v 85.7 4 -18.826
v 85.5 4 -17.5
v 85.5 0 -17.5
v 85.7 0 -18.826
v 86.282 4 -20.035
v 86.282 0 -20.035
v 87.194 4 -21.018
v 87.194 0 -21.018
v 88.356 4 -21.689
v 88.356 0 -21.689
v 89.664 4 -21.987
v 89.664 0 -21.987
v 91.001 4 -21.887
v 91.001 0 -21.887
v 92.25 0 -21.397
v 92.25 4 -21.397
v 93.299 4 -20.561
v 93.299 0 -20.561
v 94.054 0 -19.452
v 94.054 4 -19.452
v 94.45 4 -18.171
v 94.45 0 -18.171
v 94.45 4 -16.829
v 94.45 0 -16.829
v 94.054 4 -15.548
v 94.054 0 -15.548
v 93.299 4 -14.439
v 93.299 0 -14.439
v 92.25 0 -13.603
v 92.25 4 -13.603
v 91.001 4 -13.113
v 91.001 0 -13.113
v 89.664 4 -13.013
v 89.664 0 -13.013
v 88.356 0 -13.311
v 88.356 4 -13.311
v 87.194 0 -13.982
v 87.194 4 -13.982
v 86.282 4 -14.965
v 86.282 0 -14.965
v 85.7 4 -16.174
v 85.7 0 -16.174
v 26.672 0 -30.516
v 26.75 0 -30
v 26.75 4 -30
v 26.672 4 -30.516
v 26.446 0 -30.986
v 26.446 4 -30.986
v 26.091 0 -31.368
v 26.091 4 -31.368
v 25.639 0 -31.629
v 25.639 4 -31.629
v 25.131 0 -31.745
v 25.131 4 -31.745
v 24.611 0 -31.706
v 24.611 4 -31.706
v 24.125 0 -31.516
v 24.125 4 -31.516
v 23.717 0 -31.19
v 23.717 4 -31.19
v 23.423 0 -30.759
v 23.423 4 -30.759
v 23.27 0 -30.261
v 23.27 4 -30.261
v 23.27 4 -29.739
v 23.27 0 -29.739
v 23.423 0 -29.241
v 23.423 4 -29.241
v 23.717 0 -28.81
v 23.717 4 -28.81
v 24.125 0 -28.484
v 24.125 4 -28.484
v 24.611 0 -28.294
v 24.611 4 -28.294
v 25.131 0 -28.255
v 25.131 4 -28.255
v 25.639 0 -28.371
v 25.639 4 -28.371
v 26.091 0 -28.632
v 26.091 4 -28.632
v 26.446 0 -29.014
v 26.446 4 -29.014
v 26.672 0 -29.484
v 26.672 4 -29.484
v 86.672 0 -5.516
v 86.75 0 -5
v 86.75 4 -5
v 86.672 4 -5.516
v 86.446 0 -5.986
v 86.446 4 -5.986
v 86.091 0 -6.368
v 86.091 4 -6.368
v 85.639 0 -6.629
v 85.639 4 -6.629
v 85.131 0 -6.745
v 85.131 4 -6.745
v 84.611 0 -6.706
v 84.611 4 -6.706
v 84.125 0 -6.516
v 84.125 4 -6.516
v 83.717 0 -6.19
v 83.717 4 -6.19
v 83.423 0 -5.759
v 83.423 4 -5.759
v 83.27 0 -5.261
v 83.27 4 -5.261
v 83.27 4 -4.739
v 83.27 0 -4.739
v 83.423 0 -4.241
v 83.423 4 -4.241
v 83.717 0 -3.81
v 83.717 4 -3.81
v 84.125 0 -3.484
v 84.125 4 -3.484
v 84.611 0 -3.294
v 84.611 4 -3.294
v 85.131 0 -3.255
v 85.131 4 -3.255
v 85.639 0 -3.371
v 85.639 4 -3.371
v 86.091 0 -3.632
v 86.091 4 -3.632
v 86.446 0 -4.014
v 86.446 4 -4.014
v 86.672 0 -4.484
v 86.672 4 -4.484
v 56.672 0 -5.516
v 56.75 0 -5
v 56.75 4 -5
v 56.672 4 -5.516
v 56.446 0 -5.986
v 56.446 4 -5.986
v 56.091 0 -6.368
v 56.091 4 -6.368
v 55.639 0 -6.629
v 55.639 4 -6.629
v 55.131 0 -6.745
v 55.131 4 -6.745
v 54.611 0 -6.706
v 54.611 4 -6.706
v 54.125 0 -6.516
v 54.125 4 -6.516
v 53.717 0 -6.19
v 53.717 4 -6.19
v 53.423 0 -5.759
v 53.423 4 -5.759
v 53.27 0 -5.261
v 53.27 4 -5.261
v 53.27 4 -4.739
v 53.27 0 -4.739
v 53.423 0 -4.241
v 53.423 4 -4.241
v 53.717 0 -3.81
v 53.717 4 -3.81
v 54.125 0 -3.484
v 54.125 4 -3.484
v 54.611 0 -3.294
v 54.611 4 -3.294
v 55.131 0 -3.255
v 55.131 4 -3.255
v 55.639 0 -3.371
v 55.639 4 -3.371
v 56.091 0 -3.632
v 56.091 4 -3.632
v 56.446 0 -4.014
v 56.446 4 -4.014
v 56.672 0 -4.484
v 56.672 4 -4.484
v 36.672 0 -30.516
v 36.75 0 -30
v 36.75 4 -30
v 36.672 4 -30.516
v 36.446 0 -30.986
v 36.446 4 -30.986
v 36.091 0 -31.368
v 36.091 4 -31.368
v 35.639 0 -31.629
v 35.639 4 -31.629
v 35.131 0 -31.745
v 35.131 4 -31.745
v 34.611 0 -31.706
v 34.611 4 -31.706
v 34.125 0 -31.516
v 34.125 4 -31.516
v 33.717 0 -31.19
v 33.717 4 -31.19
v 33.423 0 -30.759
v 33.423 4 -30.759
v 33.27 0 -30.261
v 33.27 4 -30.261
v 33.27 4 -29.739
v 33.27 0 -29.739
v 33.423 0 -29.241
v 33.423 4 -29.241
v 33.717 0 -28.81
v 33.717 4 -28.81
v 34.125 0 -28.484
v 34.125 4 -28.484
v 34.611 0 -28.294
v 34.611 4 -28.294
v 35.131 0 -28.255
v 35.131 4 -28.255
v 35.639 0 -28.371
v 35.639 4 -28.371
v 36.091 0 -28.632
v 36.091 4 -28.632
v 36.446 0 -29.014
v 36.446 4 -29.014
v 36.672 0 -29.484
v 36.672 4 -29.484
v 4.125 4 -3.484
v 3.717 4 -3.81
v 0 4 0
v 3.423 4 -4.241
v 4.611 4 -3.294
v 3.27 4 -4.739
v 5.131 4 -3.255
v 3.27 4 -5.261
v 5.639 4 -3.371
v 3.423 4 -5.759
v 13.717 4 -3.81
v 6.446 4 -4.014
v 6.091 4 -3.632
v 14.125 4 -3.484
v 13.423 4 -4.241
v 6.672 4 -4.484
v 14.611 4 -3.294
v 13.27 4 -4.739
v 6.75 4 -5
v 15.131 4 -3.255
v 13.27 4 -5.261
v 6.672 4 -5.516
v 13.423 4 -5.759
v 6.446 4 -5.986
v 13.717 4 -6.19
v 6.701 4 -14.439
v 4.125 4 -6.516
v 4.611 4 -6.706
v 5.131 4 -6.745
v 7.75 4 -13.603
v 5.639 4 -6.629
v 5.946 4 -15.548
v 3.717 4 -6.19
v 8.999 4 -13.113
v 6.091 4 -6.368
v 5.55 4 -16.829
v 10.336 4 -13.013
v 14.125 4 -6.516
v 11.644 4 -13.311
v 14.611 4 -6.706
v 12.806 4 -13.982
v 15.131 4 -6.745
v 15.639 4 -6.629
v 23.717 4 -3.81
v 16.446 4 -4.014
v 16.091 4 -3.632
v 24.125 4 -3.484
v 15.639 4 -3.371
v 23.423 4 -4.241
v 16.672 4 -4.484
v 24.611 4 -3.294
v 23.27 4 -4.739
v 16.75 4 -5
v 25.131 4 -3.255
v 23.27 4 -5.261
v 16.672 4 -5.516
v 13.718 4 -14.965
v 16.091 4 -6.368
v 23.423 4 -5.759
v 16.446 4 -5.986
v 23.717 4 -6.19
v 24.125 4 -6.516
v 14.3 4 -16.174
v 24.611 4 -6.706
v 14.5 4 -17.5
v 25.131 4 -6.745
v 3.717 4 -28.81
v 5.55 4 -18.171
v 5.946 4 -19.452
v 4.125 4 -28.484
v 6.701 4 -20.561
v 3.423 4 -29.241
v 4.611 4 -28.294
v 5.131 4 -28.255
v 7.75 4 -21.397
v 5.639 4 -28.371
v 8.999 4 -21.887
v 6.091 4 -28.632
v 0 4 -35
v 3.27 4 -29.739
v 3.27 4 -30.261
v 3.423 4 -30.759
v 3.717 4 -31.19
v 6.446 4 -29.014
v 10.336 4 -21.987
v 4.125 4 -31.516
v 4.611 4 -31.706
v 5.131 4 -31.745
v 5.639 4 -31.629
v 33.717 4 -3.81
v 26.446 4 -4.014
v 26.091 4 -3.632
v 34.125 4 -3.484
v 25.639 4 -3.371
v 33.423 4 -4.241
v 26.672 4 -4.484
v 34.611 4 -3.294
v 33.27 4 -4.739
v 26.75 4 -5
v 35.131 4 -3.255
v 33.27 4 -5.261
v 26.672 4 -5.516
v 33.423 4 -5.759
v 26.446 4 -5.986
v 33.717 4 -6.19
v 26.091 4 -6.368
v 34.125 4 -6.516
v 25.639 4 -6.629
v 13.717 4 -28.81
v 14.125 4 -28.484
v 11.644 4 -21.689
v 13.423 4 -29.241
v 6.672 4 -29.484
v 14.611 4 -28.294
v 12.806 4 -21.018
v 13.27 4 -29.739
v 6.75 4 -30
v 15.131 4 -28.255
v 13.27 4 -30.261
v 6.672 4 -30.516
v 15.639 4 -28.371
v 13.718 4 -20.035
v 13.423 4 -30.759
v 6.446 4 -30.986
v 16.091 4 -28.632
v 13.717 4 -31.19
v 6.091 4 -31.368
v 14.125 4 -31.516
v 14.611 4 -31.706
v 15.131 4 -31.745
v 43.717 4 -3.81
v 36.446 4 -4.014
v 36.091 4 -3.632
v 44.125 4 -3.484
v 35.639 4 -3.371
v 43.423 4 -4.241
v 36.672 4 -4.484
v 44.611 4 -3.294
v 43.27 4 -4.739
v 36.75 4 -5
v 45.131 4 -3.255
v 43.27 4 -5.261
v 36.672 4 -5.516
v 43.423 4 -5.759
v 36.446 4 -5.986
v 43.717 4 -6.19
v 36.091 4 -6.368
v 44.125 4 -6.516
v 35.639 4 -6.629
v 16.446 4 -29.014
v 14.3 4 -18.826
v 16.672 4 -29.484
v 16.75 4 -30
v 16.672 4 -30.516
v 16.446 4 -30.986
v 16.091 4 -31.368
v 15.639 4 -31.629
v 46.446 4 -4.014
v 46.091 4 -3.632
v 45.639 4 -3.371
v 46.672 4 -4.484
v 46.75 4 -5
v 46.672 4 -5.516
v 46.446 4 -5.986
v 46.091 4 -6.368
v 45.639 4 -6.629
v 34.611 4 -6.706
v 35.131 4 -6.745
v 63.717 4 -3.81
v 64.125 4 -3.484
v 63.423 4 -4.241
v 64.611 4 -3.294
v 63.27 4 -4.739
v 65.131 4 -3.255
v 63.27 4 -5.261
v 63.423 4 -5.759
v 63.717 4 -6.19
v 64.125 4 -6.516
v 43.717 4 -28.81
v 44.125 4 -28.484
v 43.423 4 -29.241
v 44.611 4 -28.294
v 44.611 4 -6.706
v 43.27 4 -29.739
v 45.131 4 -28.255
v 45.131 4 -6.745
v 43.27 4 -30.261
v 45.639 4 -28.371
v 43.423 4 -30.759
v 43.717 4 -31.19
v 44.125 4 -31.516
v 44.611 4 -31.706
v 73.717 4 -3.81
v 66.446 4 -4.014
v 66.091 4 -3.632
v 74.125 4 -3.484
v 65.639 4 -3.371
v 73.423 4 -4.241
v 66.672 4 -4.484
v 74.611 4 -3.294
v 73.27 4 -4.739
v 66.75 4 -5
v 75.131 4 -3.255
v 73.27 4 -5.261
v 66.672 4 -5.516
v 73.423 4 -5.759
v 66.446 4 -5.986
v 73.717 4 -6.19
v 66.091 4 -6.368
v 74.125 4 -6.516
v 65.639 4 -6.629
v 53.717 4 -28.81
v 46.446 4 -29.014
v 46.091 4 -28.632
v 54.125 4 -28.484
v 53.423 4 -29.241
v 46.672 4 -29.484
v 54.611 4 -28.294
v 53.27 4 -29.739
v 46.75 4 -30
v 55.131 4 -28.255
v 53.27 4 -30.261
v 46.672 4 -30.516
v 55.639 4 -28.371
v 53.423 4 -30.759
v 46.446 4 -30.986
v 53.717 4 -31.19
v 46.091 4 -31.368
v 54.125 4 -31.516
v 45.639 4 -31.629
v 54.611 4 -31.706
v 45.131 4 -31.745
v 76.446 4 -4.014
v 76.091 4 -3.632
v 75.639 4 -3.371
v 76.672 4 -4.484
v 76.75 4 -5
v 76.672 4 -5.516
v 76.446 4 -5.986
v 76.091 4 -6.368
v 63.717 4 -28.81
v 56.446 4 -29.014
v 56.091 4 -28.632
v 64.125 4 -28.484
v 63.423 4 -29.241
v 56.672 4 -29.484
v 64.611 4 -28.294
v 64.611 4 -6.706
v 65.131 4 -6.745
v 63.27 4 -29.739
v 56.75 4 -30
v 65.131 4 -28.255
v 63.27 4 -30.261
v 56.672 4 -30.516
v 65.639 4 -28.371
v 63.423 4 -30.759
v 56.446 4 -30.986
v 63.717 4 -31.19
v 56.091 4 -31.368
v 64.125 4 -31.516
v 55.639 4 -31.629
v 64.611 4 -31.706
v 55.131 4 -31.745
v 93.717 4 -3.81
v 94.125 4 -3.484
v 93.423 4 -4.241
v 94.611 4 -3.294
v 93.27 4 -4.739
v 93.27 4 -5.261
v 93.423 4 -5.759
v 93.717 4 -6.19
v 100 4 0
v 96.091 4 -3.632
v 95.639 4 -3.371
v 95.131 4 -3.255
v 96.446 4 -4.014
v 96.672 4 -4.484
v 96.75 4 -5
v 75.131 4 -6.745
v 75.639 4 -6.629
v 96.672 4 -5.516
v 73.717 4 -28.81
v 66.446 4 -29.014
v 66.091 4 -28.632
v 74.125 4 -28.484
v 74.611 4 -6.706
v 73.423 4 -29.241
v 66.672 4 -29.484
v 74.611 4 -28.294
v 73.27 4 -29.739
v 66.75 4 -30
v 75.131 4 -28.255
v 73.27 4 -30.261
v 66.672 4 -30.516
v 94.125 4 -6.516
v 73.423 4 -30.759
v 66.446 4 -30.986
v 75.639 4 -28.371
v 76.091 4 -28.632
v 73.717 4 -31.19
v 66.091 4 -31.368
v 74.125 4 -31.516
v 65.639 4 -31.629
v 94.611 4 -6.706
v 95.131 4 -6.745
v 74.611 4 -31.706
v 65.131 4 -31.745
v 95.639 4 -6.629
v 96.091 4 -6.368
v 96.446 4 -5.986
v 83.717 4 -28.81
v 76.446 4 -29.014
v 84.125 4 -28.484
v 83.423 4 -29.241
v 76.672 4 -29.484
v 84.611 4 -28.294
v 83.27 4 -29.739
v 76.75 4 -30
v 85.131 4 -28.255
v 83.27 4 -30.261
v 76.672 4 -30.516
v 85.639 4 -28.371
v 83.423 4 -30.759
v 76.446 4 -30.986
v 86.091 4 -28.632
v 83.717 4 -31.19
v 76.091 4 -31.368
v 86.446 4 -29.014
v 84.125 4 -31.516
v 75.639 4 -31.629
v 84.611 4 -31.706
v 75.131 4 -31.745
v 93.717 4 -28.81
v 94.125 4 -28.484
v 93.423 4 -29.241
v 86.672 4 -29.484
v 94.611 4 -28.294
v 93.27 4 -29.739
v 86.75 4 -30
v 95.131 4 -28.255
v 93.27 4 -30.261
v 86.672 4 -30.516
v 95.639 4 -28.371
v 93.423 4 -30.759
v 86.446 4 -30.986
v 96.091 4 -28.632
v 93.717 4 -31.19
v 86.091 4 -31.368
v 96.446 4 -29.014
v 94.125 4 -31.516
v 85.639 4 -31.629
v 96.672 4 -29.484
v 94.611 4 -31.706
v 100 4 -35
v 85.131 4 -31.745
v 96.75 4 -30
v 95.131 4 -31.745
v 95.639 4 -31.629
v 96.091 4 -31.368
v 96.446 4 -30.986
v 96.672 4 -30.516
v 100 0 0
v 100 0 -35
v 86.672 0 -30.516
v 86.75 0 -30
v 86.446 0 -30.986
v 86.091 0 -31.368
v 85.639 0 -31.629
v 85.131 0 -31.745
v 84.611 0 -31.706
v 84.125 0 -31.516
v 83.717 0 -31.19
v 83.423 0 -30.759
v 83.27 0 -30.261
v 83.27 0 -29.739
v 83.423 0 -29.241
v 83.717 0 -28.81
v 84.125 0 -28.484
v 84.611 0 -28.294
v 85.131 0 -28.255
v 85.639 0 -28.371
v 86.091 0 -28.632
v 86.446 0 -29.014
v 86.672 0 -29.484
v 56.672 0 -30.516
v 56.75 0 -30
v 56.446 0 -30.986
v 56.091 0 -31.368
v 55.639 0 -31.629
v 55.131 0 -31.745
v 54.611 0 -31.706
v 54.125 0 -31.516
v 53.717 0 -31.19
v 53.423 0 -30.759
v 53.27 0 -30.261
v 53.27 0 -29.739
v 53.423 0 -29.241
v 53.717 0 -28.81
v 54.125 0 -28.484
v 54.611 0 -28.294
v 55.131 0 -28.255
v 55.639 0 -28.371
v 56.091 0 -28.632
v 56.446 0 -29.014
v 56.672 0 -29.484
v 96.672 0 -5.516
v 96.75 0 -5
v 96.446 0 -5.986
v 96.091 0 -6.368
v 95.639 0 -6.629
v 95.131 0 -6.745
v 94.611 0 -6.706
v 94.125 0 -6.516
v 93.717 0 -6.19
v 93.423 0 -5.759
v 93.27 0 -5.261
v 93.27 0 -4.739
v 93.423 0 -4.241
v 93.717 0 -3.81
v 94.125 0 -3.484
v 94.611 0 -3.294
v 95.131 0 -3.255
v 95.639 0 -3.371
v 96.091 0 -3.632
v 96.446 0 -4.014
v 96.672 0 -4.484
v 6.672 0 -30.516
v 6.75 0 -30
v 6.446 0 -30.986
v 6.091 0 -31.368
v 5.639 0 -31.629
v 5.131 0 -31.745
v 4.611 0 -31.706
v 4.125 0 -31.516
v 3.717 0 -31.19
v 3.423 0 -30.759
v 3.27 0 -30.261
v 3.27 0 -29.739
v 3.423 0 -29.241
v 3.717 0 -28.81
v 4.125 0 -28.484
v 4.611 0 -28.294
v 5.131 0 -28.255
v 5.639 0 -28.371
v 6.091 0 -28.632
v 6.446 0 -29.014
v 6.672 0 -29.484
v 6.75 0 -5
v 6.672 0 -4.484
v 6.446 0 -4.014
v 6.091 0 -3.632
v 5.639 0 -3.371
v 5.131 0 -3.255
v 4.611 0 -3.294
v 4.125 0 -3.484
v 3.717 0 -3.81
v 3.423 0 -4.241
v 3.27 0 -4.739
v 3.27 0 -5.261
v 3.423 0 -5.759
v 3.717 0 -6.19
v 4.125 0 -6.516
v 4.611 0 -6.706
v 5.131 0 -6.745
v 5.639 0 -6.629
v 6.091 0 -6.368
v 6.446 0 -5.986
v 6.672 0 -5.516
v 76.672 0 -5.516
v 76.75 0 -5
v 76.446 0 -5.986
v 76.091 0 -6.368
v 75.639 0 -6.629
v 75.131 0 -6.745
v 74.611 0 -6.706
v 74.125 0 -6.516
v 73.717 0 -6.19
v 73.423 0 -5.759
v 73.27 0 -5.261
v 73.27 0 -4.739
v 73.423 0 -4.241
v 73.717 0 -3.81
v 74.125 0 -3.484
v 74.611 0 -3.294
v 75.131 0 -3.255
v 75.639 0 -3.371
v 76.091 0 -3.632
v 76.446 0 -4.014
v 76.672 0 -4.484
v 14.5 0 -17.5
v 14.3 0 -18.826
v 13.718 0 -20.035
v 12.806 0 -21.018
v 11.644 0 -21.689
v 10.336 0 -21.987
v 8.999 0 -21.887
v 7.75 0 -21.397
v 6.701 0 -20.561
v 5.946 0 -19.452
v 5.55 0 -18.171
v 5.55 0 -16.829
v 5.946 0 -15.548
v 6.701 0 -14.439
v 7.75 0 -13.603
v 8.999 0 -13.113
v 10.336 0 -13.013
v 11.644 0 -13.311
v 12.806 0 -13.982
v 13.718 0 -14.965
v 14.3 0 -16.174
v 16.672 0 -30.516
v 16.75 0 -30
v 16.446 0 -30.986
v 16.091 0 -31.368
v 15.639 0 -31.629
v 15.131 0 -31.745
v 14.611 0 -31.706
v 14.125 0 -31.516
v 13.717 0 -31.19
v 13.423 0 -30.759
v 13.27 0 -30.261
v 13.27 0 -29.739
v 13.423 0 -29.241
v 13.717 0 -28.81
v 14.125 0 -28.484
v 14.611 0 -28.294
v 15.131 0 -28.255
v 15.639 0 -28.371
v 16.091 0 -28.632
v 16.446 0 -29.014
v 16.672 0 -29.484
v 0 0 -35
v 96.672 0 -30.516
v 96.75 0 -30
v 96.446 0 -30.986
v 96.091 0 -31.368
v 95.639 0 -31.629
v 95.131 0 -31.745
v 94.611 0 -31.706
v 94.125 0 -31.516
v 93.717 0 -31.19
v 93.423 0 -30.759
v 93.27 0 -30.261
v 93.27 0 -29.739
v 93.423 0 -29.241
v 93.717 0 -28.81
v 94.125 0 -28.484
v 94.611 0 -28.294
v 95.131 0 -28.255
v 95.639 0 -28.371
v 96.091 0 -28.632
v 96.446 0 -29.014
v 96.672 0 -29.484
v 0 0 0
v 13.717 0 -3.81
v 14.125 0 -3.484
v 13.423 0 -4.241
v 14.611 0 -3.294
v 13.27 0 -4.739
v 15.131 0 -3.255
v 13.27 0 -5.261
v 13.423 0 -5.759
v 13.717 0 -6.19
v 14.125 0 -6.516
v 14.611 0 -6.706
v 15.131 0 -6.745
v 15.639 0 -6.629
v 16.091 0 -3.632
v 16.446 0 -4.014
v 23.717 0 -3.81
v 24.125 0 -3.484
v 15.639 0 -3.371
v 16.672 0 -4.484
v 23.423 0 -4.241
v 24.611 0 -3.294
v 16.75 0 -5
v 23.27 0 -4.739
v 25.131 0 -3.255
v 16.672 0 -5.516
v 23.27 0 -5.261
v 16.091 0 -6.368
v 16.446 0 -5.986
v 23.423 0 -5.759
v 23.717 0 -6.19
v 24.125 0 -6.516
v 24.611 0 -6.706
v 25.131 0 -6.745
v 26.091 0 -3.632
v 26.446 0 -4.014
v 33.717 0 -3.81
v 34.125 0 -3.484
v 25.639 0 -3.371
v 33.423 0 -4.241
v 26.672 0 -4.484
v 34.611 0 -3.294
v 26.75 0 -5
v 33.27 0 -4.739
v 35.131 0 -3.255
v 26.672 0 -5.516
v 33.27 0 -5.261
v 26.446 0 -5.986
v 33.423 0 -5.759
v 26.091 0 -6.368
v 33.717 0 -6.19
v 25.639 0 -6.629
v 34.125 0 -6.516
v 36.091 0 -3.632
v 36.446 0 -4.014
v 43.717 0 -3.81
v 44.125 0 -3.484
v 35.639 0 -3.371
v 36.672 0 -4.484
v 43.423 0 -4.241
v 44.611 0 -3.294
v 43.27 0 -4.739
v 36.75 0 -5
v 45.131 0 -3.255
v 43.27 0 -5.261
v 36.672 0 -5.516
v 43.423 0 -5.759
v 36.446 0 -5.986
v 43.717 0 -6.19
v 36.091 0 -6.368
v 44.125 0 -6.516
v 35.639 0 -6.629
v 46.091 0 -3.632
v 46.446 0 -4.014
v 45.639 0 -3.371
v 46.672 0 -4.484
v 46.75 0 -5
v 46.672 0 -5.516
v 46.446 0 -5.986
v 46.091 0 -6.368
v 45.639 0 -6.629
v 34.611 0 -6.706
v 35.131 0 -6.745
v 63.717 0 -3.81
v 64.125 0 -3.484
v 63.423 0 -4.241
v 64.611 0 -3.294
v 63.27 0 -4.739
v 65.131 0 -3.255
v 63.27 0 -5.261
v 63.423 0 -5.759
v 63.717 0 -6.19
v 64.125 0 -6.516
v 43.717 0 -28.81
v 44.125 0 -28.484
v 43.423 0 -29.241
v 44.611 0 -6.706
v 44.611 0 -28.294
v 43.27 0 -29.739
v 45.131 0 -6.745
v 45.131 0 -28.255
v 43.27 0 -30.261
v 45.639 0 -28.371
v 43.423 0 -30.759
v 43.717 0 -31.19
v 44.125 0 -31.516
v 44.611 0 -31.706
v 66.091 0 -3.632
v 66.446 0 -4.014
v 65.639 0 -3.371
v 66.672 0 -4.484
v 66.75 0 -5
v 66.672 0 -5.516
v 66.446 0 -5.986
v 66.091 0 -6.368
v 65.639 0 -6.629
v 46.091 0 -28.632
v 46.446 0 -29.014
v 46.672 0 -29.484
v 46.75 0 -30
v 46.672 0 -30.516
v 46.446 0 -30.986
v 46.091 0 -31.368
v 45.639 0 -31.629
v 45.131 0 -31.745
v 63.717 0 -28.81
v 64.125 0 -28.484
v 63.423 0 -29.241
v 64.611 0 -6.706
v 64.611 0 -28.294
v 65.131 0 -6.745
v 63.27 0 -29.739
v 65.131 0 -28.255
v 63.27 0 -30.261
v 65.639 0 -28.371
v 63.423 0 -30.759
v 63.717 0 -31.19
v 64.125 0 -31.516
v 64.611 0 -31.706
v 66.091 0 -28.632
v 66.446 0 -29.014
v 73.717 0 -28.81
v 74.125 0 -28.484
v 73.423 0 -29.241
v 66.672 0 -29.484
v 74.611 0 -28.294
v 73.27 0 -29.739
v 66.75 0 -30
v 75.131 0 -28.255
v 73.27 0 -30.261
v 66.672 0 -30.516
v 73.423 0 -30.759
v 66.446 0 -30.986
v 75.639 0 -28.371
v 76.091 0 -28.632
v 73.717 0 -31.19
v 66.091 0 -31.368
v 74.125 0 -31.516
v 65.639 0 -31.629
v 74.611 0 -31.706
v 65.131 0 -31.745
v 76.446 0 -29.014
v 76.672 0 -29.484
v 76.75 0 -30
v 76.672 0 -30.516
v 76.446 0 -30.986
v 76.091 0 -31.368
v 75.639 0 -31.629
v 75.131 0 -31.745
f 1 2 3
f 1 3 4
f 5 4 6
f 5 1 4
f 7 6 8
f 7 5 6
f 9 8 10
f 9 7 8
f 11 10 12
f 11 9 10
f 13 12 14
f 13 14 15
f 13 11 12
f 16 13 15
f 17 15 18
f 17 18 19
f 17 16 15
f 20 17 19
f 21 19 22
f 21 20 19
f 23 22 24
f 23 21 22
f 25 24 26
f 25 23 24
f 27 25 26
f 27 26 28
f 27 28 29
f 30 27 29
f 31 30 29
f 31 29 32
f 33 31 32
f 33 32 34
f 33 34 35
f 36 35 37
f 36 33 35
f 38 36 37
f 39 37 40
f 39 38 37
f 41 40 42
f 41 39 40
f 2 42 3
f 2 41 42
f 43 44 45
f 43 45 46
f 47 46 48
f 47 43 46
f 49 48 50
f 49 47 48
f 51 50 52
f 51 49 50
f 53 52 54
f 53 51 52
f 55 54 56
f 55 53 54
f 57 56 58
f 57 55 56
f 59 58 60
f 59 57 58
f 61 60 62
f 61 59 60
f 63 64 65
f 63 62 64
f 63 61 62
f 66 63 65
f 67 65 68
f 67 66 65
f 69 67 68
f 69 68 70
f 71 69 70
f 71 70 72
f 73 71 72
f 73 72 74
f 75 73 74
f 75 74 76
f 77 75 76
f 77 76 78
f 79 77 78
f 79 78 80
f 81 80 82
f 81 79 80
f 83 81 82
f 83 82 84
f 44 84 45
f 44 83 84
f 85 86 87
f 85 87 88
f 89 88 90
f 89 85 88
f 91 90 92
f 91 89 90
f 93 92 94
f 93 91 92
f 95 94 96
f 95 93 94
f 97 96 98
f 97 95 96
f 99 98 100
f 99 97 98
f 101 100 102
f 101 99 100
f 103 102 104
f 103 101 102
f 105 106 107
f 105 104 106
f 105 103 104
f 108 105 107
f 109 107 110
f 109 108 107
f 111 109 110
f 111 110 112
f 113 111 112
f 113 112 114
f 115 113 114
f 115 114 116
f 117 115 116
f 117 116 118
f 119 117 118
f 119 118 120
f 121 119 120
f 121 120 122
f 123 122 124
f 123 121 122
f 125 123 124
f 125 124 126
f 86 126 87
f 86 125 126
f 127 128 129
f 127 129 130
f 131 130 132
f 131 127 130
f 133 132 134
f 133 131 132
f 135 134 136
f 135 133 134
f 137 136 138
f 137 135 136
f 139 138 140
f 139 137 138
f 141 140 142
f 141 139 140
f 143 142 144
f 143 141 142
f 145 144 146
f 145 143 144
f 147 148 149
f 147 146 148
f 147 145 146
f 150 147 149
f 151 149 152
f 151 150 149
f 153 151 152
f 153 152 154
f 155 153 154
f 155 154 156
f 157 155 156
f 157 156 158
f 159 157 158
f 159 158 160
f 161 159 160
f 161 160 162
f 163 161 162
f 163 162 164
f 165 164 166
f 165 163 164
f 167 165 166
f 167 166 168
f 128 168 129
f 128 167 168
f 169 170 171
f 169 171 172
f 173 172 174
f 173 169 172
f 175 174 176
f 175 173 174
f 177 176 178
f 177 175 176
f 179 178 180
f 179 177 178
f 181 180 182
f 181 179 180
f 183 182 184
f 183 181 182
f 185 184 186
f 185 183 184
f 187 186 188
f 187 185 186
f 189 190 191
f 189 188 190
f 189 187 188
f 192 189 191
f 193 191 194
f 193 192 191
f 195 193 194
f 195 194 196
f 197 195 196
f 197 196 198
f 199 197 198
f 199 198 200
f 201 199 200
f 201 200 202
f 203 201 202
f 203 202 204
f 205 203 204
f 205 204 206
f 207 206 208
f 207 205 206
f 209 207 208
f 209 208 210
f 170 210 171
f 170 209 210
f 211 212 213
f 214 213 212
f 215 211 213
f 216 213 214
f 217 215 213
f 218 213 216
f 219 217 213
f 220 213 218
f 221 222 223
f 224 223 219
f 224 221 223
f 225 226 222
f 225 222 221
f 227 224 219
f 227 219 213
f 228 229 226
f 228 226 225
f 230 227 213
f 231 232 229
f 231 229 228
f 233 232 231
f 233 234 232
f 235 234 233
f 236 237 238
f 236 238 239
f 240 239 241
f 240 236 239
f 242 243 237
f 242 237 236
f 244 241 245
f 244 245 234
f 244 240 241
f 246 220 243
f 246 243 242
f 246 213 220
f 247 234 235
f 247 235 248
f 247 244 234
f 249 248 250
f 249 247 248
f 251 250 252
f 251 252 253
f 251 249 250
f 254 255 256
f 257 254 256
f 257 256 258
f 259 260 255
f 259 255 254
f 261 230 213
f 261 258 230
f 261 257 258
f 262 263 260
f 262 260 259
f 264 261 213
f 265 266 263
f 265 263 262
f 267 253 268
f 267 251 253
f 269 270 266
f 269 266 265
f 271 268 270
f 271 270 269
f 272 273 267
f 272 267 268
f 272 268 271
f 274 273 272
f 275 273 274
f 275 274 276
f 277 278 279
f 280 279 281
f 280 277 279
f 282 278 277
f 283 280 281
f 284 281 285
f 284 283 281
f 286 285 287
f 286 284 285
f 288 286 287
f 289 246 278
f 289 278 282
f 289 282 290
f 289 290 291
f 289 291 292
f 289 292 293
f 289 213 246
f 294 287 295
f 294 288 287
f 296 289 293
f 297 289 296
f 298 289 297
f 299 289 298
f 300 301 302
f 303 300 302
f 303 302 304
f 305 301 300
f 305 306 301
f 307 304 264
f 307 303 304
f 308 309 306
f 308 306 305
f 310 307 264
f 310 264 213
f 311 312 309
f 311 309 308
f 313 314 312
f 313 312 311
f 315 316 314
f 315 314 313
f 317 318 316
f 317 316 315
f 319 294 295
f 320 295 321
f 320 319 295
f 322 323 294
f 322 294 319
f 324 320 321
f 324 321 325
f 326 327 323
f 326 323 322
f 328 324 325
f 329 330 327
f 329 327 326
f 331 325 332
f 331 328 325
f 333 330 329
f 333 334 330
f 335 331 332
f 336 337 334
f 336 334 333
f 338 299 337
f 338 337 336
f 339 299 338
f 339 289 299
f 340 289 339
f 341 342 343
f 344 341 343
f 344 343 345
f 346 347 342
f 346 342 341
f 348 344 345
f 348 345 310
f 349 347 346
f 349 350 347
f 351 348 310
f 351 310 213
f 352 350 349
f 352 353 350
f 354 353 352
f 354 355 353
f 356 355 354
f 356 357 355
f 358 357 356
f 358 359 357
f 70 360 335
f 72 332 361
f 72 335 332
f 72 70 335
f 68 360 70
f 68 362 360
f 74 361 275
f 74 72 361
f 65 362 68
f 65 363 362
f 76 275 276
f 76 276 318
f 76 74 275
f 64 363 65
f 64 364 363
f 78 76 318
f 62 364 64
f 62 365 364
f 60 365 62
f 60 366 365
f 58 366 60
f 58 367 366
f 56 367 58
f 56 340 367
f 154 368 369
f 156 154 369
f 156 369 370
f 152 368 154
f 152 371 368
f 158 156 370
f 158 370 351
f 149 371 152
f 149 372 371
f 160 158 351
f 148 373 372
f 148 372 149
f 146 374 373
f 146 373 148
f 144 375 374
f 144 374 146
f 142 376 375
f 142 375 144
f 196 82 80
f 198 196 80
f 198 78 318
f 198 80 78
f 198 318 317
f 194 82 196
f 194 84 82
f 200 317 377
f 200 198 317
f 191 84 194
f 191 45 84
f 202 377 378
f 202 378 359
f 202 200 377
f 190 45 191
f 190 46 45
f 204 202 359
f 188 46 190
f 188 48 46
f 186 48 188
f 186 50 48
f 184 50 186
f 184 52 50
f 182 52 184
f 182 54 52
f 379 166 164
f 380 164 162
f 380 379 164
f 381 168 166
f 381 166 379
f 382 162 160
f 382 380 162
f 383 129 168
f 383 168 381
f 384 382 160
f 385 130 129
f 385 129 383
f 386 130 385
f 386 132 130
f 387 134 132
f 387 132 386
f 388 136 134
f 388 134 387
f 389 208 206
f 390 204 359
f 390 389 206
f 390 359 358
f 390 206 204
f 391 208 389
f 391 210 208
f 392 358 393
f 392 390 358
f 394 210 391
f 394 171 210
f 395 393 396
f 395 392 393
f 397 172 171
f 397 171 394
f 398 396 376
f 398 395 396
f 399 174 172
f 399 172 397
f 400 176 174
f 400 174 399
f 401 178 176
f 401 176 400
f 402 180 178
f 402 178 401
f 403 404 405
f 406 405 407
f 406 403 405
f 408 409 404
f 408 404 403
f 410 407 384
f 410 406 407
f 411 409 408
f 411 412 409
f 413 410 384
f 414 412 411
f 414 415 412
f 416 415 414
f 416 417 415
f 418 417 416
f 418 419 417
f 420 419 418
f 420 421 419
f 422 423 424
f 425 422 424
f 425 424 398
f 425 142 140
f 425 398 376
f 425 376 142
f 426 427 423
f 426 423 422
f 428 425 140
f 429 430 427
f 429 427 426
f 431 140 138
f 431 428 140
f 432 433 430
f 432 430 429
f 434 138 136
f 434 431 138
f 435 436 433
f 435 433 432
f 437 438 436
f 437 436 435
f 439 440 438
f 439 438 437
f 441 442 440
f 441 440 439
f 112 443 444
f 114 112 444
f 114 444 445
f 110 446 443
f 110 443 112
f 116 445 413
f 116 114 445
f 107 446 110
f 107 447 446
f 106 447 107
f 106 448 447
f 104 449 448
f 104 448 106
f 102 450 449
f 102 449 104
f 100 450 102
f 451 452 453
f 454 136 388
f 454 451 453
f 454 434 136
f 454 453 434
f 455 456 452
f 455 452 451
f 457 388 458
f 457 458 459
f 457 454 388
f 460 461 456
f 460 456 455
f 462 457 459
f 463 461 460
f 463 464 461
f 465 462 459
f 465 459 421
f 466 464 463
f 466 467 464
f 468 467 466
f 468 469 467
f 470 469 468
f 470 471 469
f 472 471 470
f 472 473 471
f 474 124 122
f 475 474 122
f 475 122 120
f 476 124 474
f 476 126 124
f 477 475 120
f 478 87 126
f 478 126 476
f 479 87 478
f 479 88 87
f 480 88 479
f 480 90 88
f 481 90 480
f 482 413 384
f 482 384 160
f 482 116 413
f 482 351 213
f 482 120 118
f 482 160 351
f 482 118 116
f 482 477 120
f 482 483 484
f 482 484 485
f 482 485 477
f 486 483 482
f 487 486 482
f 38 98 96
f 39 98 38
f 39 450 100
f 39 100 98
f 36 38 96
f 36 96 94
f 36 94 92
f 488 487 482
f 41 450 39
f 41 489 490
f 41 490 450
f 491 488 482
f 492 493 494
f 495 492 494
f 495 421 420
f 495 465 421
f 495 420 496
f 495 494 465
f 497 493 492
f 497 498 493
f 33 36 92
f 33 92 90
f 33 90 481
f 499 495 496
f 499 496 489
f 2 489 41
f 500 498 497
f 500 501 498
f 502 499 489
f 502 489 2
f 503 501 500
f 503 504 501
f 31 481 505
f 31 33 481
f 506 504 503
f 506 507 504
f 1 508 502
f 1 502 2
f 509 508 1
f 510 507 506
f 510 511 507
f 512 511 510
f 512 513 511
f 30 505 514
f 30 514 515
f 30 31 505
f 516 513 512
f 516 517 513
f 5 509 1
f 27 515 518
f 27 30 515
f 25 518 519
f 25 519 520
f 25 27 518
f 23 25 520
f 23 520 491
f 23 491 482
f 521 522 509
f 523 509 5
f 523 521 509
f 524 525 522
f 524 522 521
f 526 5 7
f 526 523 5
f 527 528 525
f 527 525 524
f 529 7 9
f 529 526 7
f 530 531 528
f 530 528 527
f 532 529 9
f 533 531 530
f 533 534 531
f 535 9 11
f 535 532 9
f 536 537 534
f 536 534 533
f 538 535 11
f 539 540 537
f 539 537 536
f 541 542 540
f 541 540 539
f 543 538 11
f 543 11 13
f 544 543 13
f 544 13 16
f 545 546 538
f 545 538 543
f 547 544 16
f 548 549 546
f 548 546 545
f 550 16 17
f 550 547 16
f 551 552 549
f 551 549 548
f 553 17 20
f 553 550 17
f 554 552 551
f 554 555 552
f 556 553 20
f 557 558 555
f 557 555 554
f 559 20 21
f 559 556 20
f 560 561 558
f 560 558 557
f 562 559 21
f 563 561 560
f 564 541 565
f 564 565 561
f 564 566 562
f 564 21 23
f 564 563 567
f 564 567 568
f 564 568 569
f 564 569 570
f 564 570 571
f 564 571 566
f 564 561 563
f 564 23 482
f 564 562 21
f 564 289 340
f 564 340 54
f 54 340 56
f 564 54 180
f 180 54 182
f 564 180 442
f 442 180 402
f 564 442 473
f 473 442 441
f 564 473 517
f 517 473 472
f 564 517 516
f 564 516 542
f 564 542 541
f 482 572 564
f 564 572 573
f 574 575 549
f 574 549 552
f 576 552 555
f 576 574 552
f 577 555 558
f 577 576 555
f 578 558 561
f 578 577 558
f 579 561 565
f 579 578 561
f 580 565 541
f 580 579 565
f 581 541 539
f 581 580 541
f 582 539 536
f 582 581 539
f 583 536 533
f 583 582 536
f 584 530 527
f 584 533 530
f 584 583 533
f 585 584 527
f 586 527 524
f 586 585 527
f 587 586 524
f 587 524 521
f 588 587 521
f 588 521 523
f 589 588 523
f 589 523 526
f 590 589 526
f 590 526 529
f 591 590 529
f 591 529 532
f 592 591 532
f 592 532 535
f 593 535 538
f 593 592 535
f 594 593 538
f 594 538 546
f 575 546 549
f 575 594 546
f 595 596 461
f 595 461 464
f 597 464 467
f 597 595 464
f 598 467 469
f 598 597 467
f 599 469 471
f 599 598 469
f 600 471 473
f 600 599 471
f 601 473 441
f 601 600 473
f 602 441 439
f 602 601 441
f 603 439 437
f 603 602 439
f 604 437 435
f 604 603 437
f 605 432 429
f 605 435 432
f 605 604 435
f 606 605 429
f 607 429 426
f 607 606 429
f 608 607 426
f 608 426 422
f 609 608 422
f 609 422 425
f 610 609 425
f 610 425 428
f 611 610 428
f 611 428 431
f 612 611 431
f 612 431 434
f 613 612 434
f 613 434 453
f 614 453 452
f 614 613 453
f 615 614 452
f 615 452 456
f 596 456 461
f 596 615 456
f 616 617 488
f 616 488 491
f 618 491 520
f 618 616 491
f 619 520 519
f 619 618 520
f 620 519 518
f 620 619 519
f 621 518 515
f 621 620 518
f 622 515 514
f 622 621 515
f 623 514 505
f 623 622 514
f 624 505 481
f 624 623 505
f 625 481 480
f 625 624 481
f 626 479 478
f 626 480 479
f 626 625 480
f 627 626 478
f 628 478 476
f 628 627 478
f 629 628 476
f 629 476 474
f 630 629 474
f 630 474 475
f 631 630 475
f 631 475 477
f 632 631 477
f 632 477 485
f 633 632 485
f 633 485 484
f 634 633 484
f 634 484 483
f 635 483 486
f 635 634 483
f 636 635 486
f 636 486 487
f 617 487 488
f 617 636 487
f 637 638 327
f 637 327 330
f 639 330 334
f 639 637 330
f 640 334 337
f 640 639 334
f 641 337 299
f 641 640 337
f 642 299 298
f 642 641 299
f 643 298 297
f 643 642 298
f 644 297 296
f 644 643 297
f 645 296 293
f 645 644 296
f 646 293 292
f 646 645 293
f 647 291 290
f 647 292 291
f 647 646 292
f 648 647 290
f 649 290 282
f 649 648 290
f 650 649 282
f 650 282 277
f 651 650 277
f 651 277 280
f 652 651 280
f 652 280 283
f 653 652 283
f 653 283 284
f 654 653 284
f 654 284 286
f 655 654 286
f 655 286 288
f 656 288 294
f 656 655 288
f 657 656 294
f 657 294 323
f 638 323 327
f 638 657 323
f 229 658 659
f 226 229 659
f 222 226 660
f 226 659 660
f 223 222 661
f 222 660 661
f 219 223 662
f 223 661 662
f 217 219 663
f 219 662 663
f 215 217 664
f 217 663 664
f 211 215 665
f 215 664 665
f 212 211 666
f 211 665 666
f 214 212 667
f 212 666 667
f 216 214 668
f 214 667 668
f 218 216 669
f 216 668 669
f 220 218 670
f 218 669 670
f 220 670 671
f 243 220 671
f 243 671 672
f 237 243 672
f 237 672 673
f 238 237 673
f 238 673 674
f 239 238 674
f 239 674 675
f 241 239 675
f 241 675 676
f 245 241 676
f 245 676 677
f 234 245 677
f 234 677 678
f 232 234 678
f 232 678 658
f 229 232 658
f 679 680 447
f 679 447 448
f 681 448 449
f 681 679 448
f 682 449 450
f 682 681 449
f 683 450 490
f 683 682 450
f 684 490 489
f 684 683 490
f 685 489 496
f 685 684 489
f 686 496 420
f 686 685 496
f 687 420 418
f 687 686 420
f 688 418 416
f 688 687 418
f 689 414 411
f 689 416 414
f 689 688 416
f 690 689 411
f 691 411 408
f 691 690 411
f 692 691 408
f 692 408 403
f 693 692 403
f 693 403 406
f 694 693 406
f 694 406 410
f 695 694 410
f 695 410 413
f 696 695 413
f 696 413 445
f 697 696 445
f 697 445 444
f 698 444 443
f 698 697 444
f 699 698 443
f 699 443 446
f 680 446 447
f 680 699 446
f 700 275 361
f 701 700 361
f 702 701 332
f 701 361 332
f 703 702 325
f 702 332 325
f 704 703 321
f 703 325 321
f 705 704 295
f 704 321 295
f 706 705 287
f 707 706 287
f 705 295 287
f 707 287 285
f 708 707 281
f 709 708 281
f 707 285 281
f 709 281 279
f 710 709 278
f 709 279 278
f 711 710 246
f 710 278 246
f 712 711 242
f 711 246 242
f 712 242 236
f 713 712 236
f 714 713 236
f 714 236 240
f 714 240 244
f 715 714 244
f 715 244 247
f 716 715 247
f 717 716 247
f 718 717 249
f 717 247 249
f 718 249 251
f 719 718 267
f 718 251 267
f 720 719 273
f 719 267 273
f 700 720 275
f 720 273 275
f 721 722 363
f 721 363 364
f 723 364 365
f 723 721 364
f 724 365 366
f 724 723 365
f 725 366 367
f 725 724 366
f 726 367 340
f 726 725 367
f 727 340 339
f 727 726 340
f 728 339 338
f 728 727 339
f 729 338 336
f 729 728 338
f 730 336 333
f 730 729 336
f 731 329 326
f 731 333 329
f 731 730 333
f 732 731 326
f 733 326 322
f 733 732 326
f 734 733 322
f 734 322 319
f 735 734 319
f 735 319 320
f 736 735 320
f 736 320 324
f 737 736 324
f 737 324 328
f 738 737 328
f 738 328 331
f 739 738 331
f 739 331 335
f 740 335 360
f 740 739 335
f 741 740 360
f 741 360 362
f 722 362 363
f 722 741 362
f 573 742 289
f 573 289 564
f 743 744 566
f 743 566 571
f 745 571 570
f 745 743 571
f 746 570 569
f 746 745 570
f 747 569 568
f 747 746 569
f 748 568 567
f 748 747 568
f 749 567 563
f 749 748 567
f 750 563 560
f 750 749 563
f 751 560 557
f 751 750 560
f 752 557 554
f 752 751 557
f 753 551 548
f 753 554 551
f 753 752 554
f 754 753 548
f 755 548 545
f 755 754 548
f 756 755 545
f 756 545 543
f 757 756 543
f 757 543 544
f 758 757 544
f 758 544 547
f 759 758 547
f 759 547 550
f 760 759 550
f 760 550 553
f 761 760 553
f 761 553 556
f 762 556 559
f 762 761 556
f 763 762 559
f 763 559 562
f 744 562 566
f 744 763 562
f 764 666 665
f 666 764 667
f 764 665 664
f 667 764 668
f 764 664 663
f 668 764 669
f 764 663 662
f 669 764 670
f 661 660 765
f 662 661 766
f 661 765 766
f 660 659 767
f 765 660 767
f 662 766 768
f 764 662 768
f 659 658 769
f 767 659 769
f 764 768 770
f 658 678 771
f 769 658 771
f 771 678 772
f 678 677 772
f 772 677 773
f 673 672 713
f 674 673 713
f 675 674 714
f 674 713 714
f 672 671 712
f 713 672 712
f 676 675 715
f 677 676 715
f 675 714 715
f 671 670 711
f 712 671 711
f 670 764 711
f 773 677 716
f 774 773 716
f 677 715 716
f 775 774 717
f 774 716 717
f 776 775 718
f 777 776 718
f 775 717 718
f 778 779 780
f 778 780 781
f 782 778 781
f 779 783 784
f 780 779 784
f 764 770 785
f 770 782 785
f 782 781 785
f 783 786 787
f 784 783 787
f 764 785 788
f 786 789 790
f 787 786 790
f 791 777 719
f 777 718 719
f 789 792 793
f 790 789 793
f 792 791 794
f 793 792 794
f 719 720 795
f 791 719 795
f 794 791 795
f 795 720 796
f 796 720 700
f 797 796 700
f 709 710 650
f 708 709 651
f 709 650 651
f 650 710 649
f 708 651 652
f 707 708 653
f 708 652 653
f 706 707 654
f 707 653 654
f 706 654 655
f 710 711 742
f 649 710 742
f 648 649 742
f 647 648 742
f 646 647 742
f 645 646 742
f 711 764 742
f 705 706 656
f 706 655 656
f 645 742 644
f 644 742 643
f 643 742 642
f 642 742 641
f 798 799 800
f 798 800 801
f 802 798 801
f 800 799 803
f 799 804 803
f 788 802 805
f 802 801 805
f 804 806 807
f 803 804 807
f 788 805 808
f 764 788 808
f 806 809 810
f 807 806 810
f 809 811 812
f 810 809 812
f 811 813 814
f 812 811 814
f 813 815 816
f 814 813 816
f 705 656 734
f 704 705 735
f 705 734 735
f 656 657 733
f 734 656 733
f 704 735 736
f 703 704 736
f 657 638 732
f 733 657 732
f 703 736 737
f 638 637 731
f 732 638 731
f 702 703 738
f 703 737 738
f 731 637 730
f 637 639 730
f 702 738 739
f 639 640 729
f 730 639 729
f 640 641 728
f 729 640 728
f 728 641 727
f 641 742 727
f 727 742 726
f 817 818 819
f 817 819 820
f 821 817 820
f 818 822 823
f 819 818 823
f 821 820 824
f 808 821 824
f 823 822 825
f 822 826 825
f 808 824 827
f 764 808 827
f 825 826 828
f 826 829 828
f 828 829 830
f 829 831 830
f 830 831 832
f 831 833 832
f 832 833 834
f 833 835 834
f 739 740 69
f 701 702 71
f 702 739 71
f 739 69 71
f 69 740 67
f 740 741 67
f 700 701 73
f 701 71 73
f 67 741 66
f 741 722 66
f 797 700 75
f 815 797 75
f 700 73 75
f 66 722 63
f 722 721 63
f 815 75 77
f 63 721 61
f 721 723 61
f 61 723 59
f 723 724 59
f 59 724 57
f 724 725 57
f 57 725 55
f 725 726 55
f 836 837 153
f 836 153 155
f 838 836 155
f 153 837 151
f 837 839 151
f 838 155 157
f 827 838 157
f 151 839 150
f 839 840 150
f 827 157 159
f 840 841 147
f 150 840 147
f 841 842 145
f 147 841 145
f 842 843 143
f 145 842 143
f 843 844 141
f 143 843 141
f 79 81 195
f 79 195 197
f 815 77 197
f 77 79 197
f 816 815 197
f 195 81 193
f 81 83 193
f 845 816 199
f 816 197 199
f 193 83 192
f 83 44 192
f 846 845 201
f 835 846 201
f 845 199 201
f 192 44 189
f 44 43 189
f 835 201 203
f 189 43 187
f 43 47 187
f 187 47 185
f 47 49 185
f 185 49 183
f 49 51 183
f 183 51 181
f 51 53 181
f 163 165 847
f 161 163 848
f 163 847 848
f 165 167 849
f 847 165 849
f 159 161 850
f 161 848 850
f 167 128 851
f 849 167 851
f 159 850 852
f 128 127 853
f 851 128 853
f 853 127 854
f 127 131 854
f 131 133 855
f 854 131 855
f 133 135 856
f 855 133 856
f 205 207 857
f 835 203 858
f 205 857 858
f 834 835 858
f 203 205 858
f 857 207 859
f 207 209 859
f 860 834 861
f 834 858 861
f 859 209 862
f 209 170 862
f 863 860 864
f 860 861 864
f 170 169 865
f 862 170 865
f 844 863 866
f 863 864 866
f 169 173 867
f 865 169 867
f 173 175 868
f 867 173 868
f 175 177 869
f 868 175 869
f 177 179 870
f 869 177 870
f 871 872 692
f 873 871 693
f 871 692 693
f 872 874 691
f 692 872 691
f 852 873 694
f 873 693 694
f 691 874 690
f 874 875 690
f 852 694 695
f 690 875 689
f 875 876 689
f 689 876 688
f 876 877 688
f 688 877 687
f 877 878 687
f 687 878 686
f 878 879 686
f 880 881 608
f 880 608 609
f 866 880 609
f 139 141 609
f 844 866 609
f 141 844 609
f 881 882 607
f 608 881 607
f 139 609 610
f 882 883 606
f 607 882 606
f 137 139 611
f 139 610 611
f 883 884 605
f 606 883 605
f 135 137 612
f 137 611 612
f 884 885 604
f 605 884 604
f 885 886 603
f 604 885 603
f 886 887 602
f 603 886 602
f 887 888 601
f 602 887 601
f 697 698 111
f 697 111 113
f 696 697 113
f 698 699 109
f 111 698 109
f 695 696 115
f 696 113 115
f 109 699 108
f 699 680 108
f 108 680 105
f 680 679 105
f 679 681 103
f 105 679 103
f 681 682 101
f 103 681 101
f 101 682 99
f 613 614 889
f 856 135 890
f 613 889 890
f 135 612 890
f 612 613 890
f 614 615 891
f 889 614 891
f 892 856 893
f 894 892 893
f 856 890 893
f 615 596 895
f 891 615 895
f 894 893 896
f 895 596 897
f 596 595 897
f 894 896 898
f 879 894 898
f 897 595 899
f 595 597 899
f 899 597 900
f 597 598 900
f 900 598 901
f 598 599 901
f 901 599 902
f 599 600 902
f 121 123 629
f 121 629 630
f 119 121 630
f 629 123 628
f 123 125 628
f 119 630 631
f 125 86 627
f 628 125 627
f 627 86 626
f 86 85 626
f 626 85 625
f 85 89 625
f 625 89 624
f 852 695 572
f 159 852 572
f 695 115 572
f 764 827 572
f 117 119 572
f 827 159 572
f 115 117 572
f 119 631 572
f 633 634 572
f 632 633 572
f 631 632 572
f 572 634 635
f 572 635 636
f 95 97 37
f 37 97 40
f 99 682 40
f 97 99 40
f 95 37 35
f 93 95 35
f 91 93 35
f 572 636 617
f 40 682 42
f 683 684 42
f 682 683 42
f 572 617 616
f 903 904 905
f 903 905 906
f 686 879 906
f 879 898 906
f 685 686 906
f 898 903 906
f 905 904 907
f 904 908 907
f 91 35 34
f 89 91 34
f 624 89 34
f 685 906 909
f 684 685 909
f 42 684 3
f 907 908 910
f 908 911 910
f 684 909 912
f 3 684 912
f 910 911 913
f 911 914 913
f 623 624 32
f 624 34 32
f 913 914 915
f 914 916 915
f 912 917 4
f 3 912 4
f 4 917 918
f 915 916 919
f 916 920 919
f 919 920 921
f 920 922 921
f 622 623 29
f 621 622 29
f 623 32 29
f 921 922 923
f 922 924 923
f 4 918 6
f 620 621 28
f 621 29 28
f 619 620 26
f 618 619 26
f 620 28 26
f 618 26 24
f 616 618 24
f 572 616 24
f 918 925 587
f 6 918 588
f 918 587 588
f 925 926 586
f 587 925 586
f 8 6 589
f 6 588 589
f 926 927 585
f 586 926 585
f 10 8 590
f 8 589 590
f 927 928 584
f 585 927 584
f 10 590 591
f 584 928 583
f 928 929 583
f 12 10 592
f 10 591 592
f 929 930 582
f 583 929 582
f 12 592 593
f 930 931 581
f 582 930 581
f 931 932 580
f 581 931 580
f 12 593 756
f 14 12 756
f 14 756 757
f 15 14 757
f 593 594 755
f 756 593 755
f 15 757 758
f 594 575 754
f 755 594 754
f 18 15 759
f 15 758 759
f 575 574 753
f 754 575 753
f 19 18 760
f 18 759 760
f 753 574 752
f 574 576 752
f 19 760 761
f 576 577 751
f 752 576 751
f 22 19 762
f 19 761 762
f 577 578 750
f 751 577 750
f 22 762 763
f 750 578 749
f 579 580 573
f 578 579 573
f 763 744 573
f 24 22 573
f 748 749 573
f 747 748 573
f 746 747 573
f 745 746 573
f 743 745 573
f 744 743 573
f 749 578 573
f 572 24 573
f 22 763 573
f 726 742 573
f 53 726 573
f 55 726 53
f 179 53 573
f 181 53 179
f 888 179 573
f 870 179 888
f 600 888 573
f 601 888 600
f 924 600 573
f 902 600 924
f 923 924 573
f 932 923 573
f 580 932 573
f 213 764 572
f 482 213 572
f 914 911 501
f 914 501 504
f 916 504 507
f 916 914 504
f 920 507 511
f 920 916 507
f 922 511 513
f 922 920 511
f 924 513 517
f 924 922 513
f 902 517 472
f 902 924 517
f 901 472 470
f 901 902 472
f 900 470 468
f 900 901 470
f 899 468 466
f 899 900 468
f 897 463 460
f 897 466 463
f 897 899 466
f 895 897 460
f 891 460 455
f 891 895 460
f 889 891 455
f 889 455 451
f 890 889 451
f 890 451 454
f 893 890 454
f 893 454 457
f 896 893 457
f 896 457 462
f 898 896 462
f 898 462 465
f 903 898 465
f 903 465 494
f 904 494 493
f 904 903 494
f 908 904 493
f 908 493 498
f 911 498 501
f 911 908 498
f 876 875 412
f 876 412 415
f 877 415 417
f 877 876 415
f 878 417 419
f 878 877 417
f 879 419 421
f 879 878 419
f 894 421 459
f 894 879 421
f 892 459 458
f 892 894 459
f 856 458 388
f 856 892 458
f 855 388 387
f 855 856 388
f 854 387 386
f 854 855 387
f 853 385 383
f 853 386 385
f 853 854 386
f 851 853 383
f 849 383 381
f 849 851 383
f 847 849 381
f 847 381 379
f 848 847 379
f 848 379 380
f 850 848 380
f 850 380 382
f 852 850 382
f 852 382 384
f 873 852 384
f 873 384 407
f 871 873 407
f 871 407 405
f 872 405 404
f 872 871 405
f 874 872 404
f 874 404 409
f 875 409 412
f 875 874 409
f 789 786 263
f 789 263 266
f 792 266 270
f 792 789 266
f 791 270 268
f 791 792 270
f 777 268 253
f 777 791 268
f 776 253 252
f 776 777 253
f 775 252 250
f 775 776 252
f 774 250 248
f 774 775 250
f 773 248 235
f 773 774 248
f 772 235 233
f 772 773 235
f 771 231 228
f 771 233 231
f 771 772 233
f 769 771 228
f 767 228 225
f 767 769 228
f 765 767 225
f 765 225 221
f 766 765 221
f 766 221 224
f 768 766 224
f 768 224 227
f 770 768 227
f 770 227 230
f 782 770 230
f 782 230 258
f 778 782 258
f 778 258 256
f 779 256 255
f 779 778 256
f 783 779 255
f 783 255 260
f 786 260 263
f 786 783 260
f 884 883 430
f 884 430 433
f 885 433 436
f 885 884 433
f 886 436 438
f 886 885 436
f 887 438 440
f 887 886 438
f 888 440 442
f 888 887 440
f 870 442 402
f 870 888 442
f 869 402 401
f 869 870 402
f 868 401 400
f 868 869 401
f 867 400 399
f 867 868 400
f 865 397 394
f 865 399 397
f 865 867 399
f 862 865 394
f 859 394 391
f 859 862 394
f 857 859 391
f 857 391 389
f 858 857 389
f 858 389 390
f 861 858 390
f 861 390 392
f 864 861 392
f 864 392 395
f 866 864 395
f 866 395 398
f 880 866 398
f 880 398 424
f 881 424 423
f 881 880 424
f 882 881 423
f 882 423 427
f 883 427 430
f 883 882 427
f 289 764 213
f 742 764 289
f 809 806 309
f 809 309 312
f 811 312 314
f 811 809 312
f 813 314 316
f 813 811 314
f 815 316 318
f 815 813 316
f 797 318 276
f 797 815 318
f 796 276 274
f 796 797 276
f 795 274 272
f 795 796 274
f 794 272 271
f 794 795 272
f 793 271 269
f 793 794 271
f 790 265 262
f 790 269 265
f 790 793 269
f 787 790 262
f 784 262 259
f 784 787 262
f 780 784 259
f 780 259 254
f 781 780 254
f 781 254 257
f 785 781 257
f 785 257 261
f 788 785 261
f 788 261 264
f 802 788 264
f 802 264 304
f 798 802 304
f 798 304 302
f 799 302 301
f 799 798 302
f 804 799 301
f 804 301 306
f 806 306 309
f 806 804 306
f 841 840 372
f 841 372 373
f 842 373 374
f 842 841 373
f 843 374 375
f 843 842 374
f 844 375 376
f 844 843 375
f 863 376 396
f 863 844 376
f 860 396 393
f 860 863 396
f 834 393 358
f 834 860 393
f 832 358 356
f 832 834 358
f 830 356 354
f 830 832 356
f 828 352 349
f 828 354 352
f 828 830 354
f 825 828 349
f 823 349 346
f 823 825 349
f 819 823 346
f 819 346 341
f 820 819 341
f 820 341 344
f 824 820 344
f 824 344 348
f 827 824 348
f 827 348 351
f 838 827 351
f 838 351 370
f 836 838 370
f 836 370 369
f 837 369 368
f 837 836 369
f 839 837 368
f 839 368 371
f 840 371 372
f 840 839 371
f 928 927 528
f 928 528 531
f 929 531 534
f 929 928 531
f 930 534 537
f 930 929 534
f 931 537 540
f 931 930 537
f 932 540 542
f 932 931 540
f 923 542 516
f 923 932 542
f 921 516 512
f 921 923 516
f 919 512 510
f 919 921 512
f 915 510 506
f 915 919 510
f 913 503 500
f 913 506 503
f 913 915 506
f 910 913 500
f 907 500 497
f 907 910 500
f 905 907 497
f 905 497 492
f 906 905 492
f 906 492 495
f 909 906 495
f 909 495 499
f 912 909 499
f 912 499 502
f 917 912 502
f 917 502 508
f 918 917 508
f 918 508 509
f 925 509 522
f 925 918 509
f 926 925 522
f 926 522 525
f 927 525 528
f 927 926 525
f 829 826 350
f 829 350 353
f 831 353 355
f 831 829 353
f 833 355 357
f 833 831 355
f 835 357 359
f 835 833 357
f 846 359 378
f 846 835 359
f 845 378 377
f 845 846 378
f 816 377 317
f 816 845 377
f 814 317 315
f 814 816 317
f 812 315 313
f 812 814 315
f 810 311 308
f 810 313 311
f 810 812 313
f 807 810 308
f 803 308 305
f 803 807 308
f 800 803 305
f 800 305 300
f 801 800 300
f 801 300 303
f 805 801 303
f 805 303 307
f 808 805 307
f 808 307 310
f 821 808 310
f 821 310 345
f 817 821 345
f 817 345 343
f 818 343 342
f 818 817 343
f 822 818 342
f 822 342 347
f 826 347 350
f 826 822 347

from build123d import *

# Parameters (mm, degrees)
SKETCH1_W               = 100
SKETCH1_H               = 35
BOSS_EXTRUDE1_DEPTH     = 4
CUT_EXTRUDE1_START      = -5
SKETCH2_R               = 1.75
CUT_EXTRUDE1_DEPTH      = 6
LPATTERN1_COUNT         = 10
LPATTERN1_PITCH         = 10
MIRROR1_START           = -5
MIRROR1_COPY_1_SKETCH_R = 1.75
MIRROR1_COPY_1_DEPTH    = 6
MIRROR1_COPY_2_SKETCH_R = 1.75
MIRROR1_COPY_2_DEPTH    = 6
MIRROR1_COPY_3_SKETCH_R = 1.75
MIRROR1_COPY_3_DEPTH    = 6
MIRROR1_COPY_4_SKETCH_R = 1.75
MIRROR1_COPY_4_DEPTH    = 6
MIRROR1_COPY_5_SKETCH_R = 1.75
MIRROR1_COPY_5_DEPTH    = 6
MIRROR1_COPY_6_SKETCH_R = 1.75
MIRROR1_COPY_6_DEPTH    = 6
MIRROR1_COPY_7_SKETCH_R = 1.75
MIRROR1_COPY_7_DEPTH    = 6
MIRROR1_COPY_8_SKETCH_R = 1.75
MIRROR1_COPY_8_DEPTH    = 6
MIRROR1_COPY_9_SKETCH_R = 1.75
MIRROR1_COPY_9_DEPTH    = 6
SKETCH2_3_R             = 4.5
CUT_EXTRUDE3_DEPTH      = 4


with BuildPart() as part:
    # Sketch1 → Boss-Extrude1 (new body)
    with BuildSketch(Plane(origin=(0, 0, 0), x_dir=(1, 0, 0), z_dir=(0, 1, 0))):
        with Locations((50, 17.5)):
            Rectangle(SKETCH1_W, SKETCH1_H)
    extrude(amount=BOSS_EXTRUDE1_DEPTH)

    # Sketch2 → Cut-Extrude1 (cut)
    with BuildSketch(Plane(origin=(0, 4, 0), x_dir=(1, 0, 0), z_dir=(0, 1, 0)).offset(CUT_EXTRUDE1_START)):
        with Locations((5, 30)):
            Circle(SKETCH2_R)
    cut_extrude1 = extrude(amount=CUT_EXTRUDE1_DEPTH, mode=Mode.SUBTRACT)

    # LPattern1: Cut-Extrude1 ×10
    with Locations(*[(i * LPATTERN1_PITCH, 0, 0) for i in range(1, LPATTERN1_COUNT)]):
        add(cut_extrude1, mode=Mode.SUBTRACT)

    # Mirror1: Cut-Extrude1 across plane
    add(cut_extrude1.mirror(Plane(origin=(0, 0, -17.5), x_dir=(1, 0, 0), z_dir=(0, 0, -1))), mode=Mode.SUBTRACT)

    # Mirror1 copy 1 sketch → Mirror1 copy 1 (cut)
    with BuildSketch(Plane(origin=(10, 4, -35), x_dir=(1, 0, 0), z_dir=(0, 1, 0)).offset(MIRROR1_START)):
        with Locations((5, -30)):
            Circle(MIRROR1_COPY_1_SKETCH_R)
    extrude(amount=MIRROR1_COPY_1_DEPTH, mode=Mode.SUBTRACT)

    # Mirror1 copy 2 sketch → Mirror1 copy 2 (cut)
    with BuildSketch(Plane(origin=(20, 4, -35), x_dir=(1, 0, 0), z_dir=(0, 1, 0)).offset(MIRROR1_START)):
        with Locations((5, -30)):
            Circle(MIRROR1_COPY_2_SKETCH_R)
    extrude(amount=MIRROR1_COPY_2_DEPTH, mode=Mode.SUBTRACT)

    # Mirror1 copy 3 sketch → Mirror1 copy 3 (cut)
    with BuildSketch(Plane(origin=(30, 4, -35), x_dir=(1, 0, 0), z_dir=(0, 1, 0)).offset(MIRROR1_START)):
        with Locations((5, -30)):
            Circle(MIRROR1_COPY_3_SKETCH_R)
    extrude(amount=MIRROR1_COPY_3_DEPTH, mode=Mode.SUBTRACT)

    # Mirror1 copy 4 sketch → Mirror1 copy 4 (cut)
    with BuildSketch(Plane(origin=(40, 4, -35), x_dir=(1, 0, 0), z_dir=(0, 1, 0)).offset(MIRROR1_START)):
        with Locations((5, -30)):
            Circle(MIRROR1_COPY_4_SKETCH_R)
    extrude(amount=MIRROR1_COPY_4_DEPTH, mode=Mode.SUBTRACT)

    # Mirror1 copy 5 sketch → Mirror1 copy 5 (cut)
    with BuildSketch(Plane(origin=(50, 4, -35), x_dir=(1, 0, 0), z_dir=(0, 1, 0)).offset(MIRROR1_START)):
        with Locations((5, -30)):
            Circle(MIRROR1_COPY_5_SKETCH_R)
    extrude(amount=MIRROR1_COPY_5_DEPTH, mode=Mode.SUBTRACT)

    # Mirror1 copy 6 sketch → Mirror1 copy 6 (cut)
    with BuildSketch(Plane(origin=(60, 4, -35), x_dir=(1, 0, 0), z_dir=(0, 1, 0)).offset(MIRROR1_START)):
        with Locations((5, -30)):
            Circle(MIRROR1_COPY_6_SKETCH_R)
    extrude(amount=MIRROR1_COPY_6_DEPTH, mode=Mode.SUBTRACT)

    # Mirror1 copy 7 sketch → Mirror1 copy 7 (cut)
    with BuildSketch(Plane(origin=(70, 4, -35), x_dir=(1, 0, 0), z_dir=(0, 1, 0)).offset(MIRROR1_START)):
        with Locations((5, -30)):
            Circle(MIRROR1_COPY_7_SKETCH_R)
    extrude(amount=MIRROR1_COPY_7_DEPTH, mode=Mode.SUBTRACT)

    # Mirror1 copy 8 sketch → Mirror1 copy 8 (cut)
    with BuildSketch(Plane(origin=(80, 4, -35), x_dir=(1, 0, 0), z_dir=(0, 1, 0)).offset(MIRROR1_START)):
        with Locations((5, -30)):
            Circle(MIRROR1_COPY_8_SKETCH_R)
    extrude(amount=MIRROR1_COPY_8_DEPTH, mode=Mode.SUBTRACT)

    # Mirror1 copy 9 sketch → Mirror1 copy 9 (cut)
    with BuildSketch(Plane(origin=(90, 4, -35), x_dir=(1, 0, 0), z_dir=(0, 1, 0)).offset(MIRROR1_START)):
        with Locations((5, -30)):
            Circle(MIRROR1_COPY_9_SKETCH_R)
    extrude(amount=MIRROR1_COPY_9_DEPTH, mode=Mode.SUBTRACT)

    # Sketch2<3> → Cut-Extrude3 (cut)
    with BuildSketch(Plane(origin=(0, 4, 0), x_dir=(1, 0, 0), z_dir=(0, 1, 0))):
        with Locations((10, 17.5)):
            Circle(SKETCH2_3_R)
    cut_extrude3 = extrude(amount=-CUT_EXTRUDE3_DEPTH, mode=Mode.SUBTRACT)

    # Mirror2: Cut-Extrude3 across plane
    add(cut_extrude3.mirror(Plane(origin=(50, 0, 0), x_dir=(0, 0, 1), z_dir=(1, 0, 0))), mode=Mode.SUBTRACT)


solid = part.part
